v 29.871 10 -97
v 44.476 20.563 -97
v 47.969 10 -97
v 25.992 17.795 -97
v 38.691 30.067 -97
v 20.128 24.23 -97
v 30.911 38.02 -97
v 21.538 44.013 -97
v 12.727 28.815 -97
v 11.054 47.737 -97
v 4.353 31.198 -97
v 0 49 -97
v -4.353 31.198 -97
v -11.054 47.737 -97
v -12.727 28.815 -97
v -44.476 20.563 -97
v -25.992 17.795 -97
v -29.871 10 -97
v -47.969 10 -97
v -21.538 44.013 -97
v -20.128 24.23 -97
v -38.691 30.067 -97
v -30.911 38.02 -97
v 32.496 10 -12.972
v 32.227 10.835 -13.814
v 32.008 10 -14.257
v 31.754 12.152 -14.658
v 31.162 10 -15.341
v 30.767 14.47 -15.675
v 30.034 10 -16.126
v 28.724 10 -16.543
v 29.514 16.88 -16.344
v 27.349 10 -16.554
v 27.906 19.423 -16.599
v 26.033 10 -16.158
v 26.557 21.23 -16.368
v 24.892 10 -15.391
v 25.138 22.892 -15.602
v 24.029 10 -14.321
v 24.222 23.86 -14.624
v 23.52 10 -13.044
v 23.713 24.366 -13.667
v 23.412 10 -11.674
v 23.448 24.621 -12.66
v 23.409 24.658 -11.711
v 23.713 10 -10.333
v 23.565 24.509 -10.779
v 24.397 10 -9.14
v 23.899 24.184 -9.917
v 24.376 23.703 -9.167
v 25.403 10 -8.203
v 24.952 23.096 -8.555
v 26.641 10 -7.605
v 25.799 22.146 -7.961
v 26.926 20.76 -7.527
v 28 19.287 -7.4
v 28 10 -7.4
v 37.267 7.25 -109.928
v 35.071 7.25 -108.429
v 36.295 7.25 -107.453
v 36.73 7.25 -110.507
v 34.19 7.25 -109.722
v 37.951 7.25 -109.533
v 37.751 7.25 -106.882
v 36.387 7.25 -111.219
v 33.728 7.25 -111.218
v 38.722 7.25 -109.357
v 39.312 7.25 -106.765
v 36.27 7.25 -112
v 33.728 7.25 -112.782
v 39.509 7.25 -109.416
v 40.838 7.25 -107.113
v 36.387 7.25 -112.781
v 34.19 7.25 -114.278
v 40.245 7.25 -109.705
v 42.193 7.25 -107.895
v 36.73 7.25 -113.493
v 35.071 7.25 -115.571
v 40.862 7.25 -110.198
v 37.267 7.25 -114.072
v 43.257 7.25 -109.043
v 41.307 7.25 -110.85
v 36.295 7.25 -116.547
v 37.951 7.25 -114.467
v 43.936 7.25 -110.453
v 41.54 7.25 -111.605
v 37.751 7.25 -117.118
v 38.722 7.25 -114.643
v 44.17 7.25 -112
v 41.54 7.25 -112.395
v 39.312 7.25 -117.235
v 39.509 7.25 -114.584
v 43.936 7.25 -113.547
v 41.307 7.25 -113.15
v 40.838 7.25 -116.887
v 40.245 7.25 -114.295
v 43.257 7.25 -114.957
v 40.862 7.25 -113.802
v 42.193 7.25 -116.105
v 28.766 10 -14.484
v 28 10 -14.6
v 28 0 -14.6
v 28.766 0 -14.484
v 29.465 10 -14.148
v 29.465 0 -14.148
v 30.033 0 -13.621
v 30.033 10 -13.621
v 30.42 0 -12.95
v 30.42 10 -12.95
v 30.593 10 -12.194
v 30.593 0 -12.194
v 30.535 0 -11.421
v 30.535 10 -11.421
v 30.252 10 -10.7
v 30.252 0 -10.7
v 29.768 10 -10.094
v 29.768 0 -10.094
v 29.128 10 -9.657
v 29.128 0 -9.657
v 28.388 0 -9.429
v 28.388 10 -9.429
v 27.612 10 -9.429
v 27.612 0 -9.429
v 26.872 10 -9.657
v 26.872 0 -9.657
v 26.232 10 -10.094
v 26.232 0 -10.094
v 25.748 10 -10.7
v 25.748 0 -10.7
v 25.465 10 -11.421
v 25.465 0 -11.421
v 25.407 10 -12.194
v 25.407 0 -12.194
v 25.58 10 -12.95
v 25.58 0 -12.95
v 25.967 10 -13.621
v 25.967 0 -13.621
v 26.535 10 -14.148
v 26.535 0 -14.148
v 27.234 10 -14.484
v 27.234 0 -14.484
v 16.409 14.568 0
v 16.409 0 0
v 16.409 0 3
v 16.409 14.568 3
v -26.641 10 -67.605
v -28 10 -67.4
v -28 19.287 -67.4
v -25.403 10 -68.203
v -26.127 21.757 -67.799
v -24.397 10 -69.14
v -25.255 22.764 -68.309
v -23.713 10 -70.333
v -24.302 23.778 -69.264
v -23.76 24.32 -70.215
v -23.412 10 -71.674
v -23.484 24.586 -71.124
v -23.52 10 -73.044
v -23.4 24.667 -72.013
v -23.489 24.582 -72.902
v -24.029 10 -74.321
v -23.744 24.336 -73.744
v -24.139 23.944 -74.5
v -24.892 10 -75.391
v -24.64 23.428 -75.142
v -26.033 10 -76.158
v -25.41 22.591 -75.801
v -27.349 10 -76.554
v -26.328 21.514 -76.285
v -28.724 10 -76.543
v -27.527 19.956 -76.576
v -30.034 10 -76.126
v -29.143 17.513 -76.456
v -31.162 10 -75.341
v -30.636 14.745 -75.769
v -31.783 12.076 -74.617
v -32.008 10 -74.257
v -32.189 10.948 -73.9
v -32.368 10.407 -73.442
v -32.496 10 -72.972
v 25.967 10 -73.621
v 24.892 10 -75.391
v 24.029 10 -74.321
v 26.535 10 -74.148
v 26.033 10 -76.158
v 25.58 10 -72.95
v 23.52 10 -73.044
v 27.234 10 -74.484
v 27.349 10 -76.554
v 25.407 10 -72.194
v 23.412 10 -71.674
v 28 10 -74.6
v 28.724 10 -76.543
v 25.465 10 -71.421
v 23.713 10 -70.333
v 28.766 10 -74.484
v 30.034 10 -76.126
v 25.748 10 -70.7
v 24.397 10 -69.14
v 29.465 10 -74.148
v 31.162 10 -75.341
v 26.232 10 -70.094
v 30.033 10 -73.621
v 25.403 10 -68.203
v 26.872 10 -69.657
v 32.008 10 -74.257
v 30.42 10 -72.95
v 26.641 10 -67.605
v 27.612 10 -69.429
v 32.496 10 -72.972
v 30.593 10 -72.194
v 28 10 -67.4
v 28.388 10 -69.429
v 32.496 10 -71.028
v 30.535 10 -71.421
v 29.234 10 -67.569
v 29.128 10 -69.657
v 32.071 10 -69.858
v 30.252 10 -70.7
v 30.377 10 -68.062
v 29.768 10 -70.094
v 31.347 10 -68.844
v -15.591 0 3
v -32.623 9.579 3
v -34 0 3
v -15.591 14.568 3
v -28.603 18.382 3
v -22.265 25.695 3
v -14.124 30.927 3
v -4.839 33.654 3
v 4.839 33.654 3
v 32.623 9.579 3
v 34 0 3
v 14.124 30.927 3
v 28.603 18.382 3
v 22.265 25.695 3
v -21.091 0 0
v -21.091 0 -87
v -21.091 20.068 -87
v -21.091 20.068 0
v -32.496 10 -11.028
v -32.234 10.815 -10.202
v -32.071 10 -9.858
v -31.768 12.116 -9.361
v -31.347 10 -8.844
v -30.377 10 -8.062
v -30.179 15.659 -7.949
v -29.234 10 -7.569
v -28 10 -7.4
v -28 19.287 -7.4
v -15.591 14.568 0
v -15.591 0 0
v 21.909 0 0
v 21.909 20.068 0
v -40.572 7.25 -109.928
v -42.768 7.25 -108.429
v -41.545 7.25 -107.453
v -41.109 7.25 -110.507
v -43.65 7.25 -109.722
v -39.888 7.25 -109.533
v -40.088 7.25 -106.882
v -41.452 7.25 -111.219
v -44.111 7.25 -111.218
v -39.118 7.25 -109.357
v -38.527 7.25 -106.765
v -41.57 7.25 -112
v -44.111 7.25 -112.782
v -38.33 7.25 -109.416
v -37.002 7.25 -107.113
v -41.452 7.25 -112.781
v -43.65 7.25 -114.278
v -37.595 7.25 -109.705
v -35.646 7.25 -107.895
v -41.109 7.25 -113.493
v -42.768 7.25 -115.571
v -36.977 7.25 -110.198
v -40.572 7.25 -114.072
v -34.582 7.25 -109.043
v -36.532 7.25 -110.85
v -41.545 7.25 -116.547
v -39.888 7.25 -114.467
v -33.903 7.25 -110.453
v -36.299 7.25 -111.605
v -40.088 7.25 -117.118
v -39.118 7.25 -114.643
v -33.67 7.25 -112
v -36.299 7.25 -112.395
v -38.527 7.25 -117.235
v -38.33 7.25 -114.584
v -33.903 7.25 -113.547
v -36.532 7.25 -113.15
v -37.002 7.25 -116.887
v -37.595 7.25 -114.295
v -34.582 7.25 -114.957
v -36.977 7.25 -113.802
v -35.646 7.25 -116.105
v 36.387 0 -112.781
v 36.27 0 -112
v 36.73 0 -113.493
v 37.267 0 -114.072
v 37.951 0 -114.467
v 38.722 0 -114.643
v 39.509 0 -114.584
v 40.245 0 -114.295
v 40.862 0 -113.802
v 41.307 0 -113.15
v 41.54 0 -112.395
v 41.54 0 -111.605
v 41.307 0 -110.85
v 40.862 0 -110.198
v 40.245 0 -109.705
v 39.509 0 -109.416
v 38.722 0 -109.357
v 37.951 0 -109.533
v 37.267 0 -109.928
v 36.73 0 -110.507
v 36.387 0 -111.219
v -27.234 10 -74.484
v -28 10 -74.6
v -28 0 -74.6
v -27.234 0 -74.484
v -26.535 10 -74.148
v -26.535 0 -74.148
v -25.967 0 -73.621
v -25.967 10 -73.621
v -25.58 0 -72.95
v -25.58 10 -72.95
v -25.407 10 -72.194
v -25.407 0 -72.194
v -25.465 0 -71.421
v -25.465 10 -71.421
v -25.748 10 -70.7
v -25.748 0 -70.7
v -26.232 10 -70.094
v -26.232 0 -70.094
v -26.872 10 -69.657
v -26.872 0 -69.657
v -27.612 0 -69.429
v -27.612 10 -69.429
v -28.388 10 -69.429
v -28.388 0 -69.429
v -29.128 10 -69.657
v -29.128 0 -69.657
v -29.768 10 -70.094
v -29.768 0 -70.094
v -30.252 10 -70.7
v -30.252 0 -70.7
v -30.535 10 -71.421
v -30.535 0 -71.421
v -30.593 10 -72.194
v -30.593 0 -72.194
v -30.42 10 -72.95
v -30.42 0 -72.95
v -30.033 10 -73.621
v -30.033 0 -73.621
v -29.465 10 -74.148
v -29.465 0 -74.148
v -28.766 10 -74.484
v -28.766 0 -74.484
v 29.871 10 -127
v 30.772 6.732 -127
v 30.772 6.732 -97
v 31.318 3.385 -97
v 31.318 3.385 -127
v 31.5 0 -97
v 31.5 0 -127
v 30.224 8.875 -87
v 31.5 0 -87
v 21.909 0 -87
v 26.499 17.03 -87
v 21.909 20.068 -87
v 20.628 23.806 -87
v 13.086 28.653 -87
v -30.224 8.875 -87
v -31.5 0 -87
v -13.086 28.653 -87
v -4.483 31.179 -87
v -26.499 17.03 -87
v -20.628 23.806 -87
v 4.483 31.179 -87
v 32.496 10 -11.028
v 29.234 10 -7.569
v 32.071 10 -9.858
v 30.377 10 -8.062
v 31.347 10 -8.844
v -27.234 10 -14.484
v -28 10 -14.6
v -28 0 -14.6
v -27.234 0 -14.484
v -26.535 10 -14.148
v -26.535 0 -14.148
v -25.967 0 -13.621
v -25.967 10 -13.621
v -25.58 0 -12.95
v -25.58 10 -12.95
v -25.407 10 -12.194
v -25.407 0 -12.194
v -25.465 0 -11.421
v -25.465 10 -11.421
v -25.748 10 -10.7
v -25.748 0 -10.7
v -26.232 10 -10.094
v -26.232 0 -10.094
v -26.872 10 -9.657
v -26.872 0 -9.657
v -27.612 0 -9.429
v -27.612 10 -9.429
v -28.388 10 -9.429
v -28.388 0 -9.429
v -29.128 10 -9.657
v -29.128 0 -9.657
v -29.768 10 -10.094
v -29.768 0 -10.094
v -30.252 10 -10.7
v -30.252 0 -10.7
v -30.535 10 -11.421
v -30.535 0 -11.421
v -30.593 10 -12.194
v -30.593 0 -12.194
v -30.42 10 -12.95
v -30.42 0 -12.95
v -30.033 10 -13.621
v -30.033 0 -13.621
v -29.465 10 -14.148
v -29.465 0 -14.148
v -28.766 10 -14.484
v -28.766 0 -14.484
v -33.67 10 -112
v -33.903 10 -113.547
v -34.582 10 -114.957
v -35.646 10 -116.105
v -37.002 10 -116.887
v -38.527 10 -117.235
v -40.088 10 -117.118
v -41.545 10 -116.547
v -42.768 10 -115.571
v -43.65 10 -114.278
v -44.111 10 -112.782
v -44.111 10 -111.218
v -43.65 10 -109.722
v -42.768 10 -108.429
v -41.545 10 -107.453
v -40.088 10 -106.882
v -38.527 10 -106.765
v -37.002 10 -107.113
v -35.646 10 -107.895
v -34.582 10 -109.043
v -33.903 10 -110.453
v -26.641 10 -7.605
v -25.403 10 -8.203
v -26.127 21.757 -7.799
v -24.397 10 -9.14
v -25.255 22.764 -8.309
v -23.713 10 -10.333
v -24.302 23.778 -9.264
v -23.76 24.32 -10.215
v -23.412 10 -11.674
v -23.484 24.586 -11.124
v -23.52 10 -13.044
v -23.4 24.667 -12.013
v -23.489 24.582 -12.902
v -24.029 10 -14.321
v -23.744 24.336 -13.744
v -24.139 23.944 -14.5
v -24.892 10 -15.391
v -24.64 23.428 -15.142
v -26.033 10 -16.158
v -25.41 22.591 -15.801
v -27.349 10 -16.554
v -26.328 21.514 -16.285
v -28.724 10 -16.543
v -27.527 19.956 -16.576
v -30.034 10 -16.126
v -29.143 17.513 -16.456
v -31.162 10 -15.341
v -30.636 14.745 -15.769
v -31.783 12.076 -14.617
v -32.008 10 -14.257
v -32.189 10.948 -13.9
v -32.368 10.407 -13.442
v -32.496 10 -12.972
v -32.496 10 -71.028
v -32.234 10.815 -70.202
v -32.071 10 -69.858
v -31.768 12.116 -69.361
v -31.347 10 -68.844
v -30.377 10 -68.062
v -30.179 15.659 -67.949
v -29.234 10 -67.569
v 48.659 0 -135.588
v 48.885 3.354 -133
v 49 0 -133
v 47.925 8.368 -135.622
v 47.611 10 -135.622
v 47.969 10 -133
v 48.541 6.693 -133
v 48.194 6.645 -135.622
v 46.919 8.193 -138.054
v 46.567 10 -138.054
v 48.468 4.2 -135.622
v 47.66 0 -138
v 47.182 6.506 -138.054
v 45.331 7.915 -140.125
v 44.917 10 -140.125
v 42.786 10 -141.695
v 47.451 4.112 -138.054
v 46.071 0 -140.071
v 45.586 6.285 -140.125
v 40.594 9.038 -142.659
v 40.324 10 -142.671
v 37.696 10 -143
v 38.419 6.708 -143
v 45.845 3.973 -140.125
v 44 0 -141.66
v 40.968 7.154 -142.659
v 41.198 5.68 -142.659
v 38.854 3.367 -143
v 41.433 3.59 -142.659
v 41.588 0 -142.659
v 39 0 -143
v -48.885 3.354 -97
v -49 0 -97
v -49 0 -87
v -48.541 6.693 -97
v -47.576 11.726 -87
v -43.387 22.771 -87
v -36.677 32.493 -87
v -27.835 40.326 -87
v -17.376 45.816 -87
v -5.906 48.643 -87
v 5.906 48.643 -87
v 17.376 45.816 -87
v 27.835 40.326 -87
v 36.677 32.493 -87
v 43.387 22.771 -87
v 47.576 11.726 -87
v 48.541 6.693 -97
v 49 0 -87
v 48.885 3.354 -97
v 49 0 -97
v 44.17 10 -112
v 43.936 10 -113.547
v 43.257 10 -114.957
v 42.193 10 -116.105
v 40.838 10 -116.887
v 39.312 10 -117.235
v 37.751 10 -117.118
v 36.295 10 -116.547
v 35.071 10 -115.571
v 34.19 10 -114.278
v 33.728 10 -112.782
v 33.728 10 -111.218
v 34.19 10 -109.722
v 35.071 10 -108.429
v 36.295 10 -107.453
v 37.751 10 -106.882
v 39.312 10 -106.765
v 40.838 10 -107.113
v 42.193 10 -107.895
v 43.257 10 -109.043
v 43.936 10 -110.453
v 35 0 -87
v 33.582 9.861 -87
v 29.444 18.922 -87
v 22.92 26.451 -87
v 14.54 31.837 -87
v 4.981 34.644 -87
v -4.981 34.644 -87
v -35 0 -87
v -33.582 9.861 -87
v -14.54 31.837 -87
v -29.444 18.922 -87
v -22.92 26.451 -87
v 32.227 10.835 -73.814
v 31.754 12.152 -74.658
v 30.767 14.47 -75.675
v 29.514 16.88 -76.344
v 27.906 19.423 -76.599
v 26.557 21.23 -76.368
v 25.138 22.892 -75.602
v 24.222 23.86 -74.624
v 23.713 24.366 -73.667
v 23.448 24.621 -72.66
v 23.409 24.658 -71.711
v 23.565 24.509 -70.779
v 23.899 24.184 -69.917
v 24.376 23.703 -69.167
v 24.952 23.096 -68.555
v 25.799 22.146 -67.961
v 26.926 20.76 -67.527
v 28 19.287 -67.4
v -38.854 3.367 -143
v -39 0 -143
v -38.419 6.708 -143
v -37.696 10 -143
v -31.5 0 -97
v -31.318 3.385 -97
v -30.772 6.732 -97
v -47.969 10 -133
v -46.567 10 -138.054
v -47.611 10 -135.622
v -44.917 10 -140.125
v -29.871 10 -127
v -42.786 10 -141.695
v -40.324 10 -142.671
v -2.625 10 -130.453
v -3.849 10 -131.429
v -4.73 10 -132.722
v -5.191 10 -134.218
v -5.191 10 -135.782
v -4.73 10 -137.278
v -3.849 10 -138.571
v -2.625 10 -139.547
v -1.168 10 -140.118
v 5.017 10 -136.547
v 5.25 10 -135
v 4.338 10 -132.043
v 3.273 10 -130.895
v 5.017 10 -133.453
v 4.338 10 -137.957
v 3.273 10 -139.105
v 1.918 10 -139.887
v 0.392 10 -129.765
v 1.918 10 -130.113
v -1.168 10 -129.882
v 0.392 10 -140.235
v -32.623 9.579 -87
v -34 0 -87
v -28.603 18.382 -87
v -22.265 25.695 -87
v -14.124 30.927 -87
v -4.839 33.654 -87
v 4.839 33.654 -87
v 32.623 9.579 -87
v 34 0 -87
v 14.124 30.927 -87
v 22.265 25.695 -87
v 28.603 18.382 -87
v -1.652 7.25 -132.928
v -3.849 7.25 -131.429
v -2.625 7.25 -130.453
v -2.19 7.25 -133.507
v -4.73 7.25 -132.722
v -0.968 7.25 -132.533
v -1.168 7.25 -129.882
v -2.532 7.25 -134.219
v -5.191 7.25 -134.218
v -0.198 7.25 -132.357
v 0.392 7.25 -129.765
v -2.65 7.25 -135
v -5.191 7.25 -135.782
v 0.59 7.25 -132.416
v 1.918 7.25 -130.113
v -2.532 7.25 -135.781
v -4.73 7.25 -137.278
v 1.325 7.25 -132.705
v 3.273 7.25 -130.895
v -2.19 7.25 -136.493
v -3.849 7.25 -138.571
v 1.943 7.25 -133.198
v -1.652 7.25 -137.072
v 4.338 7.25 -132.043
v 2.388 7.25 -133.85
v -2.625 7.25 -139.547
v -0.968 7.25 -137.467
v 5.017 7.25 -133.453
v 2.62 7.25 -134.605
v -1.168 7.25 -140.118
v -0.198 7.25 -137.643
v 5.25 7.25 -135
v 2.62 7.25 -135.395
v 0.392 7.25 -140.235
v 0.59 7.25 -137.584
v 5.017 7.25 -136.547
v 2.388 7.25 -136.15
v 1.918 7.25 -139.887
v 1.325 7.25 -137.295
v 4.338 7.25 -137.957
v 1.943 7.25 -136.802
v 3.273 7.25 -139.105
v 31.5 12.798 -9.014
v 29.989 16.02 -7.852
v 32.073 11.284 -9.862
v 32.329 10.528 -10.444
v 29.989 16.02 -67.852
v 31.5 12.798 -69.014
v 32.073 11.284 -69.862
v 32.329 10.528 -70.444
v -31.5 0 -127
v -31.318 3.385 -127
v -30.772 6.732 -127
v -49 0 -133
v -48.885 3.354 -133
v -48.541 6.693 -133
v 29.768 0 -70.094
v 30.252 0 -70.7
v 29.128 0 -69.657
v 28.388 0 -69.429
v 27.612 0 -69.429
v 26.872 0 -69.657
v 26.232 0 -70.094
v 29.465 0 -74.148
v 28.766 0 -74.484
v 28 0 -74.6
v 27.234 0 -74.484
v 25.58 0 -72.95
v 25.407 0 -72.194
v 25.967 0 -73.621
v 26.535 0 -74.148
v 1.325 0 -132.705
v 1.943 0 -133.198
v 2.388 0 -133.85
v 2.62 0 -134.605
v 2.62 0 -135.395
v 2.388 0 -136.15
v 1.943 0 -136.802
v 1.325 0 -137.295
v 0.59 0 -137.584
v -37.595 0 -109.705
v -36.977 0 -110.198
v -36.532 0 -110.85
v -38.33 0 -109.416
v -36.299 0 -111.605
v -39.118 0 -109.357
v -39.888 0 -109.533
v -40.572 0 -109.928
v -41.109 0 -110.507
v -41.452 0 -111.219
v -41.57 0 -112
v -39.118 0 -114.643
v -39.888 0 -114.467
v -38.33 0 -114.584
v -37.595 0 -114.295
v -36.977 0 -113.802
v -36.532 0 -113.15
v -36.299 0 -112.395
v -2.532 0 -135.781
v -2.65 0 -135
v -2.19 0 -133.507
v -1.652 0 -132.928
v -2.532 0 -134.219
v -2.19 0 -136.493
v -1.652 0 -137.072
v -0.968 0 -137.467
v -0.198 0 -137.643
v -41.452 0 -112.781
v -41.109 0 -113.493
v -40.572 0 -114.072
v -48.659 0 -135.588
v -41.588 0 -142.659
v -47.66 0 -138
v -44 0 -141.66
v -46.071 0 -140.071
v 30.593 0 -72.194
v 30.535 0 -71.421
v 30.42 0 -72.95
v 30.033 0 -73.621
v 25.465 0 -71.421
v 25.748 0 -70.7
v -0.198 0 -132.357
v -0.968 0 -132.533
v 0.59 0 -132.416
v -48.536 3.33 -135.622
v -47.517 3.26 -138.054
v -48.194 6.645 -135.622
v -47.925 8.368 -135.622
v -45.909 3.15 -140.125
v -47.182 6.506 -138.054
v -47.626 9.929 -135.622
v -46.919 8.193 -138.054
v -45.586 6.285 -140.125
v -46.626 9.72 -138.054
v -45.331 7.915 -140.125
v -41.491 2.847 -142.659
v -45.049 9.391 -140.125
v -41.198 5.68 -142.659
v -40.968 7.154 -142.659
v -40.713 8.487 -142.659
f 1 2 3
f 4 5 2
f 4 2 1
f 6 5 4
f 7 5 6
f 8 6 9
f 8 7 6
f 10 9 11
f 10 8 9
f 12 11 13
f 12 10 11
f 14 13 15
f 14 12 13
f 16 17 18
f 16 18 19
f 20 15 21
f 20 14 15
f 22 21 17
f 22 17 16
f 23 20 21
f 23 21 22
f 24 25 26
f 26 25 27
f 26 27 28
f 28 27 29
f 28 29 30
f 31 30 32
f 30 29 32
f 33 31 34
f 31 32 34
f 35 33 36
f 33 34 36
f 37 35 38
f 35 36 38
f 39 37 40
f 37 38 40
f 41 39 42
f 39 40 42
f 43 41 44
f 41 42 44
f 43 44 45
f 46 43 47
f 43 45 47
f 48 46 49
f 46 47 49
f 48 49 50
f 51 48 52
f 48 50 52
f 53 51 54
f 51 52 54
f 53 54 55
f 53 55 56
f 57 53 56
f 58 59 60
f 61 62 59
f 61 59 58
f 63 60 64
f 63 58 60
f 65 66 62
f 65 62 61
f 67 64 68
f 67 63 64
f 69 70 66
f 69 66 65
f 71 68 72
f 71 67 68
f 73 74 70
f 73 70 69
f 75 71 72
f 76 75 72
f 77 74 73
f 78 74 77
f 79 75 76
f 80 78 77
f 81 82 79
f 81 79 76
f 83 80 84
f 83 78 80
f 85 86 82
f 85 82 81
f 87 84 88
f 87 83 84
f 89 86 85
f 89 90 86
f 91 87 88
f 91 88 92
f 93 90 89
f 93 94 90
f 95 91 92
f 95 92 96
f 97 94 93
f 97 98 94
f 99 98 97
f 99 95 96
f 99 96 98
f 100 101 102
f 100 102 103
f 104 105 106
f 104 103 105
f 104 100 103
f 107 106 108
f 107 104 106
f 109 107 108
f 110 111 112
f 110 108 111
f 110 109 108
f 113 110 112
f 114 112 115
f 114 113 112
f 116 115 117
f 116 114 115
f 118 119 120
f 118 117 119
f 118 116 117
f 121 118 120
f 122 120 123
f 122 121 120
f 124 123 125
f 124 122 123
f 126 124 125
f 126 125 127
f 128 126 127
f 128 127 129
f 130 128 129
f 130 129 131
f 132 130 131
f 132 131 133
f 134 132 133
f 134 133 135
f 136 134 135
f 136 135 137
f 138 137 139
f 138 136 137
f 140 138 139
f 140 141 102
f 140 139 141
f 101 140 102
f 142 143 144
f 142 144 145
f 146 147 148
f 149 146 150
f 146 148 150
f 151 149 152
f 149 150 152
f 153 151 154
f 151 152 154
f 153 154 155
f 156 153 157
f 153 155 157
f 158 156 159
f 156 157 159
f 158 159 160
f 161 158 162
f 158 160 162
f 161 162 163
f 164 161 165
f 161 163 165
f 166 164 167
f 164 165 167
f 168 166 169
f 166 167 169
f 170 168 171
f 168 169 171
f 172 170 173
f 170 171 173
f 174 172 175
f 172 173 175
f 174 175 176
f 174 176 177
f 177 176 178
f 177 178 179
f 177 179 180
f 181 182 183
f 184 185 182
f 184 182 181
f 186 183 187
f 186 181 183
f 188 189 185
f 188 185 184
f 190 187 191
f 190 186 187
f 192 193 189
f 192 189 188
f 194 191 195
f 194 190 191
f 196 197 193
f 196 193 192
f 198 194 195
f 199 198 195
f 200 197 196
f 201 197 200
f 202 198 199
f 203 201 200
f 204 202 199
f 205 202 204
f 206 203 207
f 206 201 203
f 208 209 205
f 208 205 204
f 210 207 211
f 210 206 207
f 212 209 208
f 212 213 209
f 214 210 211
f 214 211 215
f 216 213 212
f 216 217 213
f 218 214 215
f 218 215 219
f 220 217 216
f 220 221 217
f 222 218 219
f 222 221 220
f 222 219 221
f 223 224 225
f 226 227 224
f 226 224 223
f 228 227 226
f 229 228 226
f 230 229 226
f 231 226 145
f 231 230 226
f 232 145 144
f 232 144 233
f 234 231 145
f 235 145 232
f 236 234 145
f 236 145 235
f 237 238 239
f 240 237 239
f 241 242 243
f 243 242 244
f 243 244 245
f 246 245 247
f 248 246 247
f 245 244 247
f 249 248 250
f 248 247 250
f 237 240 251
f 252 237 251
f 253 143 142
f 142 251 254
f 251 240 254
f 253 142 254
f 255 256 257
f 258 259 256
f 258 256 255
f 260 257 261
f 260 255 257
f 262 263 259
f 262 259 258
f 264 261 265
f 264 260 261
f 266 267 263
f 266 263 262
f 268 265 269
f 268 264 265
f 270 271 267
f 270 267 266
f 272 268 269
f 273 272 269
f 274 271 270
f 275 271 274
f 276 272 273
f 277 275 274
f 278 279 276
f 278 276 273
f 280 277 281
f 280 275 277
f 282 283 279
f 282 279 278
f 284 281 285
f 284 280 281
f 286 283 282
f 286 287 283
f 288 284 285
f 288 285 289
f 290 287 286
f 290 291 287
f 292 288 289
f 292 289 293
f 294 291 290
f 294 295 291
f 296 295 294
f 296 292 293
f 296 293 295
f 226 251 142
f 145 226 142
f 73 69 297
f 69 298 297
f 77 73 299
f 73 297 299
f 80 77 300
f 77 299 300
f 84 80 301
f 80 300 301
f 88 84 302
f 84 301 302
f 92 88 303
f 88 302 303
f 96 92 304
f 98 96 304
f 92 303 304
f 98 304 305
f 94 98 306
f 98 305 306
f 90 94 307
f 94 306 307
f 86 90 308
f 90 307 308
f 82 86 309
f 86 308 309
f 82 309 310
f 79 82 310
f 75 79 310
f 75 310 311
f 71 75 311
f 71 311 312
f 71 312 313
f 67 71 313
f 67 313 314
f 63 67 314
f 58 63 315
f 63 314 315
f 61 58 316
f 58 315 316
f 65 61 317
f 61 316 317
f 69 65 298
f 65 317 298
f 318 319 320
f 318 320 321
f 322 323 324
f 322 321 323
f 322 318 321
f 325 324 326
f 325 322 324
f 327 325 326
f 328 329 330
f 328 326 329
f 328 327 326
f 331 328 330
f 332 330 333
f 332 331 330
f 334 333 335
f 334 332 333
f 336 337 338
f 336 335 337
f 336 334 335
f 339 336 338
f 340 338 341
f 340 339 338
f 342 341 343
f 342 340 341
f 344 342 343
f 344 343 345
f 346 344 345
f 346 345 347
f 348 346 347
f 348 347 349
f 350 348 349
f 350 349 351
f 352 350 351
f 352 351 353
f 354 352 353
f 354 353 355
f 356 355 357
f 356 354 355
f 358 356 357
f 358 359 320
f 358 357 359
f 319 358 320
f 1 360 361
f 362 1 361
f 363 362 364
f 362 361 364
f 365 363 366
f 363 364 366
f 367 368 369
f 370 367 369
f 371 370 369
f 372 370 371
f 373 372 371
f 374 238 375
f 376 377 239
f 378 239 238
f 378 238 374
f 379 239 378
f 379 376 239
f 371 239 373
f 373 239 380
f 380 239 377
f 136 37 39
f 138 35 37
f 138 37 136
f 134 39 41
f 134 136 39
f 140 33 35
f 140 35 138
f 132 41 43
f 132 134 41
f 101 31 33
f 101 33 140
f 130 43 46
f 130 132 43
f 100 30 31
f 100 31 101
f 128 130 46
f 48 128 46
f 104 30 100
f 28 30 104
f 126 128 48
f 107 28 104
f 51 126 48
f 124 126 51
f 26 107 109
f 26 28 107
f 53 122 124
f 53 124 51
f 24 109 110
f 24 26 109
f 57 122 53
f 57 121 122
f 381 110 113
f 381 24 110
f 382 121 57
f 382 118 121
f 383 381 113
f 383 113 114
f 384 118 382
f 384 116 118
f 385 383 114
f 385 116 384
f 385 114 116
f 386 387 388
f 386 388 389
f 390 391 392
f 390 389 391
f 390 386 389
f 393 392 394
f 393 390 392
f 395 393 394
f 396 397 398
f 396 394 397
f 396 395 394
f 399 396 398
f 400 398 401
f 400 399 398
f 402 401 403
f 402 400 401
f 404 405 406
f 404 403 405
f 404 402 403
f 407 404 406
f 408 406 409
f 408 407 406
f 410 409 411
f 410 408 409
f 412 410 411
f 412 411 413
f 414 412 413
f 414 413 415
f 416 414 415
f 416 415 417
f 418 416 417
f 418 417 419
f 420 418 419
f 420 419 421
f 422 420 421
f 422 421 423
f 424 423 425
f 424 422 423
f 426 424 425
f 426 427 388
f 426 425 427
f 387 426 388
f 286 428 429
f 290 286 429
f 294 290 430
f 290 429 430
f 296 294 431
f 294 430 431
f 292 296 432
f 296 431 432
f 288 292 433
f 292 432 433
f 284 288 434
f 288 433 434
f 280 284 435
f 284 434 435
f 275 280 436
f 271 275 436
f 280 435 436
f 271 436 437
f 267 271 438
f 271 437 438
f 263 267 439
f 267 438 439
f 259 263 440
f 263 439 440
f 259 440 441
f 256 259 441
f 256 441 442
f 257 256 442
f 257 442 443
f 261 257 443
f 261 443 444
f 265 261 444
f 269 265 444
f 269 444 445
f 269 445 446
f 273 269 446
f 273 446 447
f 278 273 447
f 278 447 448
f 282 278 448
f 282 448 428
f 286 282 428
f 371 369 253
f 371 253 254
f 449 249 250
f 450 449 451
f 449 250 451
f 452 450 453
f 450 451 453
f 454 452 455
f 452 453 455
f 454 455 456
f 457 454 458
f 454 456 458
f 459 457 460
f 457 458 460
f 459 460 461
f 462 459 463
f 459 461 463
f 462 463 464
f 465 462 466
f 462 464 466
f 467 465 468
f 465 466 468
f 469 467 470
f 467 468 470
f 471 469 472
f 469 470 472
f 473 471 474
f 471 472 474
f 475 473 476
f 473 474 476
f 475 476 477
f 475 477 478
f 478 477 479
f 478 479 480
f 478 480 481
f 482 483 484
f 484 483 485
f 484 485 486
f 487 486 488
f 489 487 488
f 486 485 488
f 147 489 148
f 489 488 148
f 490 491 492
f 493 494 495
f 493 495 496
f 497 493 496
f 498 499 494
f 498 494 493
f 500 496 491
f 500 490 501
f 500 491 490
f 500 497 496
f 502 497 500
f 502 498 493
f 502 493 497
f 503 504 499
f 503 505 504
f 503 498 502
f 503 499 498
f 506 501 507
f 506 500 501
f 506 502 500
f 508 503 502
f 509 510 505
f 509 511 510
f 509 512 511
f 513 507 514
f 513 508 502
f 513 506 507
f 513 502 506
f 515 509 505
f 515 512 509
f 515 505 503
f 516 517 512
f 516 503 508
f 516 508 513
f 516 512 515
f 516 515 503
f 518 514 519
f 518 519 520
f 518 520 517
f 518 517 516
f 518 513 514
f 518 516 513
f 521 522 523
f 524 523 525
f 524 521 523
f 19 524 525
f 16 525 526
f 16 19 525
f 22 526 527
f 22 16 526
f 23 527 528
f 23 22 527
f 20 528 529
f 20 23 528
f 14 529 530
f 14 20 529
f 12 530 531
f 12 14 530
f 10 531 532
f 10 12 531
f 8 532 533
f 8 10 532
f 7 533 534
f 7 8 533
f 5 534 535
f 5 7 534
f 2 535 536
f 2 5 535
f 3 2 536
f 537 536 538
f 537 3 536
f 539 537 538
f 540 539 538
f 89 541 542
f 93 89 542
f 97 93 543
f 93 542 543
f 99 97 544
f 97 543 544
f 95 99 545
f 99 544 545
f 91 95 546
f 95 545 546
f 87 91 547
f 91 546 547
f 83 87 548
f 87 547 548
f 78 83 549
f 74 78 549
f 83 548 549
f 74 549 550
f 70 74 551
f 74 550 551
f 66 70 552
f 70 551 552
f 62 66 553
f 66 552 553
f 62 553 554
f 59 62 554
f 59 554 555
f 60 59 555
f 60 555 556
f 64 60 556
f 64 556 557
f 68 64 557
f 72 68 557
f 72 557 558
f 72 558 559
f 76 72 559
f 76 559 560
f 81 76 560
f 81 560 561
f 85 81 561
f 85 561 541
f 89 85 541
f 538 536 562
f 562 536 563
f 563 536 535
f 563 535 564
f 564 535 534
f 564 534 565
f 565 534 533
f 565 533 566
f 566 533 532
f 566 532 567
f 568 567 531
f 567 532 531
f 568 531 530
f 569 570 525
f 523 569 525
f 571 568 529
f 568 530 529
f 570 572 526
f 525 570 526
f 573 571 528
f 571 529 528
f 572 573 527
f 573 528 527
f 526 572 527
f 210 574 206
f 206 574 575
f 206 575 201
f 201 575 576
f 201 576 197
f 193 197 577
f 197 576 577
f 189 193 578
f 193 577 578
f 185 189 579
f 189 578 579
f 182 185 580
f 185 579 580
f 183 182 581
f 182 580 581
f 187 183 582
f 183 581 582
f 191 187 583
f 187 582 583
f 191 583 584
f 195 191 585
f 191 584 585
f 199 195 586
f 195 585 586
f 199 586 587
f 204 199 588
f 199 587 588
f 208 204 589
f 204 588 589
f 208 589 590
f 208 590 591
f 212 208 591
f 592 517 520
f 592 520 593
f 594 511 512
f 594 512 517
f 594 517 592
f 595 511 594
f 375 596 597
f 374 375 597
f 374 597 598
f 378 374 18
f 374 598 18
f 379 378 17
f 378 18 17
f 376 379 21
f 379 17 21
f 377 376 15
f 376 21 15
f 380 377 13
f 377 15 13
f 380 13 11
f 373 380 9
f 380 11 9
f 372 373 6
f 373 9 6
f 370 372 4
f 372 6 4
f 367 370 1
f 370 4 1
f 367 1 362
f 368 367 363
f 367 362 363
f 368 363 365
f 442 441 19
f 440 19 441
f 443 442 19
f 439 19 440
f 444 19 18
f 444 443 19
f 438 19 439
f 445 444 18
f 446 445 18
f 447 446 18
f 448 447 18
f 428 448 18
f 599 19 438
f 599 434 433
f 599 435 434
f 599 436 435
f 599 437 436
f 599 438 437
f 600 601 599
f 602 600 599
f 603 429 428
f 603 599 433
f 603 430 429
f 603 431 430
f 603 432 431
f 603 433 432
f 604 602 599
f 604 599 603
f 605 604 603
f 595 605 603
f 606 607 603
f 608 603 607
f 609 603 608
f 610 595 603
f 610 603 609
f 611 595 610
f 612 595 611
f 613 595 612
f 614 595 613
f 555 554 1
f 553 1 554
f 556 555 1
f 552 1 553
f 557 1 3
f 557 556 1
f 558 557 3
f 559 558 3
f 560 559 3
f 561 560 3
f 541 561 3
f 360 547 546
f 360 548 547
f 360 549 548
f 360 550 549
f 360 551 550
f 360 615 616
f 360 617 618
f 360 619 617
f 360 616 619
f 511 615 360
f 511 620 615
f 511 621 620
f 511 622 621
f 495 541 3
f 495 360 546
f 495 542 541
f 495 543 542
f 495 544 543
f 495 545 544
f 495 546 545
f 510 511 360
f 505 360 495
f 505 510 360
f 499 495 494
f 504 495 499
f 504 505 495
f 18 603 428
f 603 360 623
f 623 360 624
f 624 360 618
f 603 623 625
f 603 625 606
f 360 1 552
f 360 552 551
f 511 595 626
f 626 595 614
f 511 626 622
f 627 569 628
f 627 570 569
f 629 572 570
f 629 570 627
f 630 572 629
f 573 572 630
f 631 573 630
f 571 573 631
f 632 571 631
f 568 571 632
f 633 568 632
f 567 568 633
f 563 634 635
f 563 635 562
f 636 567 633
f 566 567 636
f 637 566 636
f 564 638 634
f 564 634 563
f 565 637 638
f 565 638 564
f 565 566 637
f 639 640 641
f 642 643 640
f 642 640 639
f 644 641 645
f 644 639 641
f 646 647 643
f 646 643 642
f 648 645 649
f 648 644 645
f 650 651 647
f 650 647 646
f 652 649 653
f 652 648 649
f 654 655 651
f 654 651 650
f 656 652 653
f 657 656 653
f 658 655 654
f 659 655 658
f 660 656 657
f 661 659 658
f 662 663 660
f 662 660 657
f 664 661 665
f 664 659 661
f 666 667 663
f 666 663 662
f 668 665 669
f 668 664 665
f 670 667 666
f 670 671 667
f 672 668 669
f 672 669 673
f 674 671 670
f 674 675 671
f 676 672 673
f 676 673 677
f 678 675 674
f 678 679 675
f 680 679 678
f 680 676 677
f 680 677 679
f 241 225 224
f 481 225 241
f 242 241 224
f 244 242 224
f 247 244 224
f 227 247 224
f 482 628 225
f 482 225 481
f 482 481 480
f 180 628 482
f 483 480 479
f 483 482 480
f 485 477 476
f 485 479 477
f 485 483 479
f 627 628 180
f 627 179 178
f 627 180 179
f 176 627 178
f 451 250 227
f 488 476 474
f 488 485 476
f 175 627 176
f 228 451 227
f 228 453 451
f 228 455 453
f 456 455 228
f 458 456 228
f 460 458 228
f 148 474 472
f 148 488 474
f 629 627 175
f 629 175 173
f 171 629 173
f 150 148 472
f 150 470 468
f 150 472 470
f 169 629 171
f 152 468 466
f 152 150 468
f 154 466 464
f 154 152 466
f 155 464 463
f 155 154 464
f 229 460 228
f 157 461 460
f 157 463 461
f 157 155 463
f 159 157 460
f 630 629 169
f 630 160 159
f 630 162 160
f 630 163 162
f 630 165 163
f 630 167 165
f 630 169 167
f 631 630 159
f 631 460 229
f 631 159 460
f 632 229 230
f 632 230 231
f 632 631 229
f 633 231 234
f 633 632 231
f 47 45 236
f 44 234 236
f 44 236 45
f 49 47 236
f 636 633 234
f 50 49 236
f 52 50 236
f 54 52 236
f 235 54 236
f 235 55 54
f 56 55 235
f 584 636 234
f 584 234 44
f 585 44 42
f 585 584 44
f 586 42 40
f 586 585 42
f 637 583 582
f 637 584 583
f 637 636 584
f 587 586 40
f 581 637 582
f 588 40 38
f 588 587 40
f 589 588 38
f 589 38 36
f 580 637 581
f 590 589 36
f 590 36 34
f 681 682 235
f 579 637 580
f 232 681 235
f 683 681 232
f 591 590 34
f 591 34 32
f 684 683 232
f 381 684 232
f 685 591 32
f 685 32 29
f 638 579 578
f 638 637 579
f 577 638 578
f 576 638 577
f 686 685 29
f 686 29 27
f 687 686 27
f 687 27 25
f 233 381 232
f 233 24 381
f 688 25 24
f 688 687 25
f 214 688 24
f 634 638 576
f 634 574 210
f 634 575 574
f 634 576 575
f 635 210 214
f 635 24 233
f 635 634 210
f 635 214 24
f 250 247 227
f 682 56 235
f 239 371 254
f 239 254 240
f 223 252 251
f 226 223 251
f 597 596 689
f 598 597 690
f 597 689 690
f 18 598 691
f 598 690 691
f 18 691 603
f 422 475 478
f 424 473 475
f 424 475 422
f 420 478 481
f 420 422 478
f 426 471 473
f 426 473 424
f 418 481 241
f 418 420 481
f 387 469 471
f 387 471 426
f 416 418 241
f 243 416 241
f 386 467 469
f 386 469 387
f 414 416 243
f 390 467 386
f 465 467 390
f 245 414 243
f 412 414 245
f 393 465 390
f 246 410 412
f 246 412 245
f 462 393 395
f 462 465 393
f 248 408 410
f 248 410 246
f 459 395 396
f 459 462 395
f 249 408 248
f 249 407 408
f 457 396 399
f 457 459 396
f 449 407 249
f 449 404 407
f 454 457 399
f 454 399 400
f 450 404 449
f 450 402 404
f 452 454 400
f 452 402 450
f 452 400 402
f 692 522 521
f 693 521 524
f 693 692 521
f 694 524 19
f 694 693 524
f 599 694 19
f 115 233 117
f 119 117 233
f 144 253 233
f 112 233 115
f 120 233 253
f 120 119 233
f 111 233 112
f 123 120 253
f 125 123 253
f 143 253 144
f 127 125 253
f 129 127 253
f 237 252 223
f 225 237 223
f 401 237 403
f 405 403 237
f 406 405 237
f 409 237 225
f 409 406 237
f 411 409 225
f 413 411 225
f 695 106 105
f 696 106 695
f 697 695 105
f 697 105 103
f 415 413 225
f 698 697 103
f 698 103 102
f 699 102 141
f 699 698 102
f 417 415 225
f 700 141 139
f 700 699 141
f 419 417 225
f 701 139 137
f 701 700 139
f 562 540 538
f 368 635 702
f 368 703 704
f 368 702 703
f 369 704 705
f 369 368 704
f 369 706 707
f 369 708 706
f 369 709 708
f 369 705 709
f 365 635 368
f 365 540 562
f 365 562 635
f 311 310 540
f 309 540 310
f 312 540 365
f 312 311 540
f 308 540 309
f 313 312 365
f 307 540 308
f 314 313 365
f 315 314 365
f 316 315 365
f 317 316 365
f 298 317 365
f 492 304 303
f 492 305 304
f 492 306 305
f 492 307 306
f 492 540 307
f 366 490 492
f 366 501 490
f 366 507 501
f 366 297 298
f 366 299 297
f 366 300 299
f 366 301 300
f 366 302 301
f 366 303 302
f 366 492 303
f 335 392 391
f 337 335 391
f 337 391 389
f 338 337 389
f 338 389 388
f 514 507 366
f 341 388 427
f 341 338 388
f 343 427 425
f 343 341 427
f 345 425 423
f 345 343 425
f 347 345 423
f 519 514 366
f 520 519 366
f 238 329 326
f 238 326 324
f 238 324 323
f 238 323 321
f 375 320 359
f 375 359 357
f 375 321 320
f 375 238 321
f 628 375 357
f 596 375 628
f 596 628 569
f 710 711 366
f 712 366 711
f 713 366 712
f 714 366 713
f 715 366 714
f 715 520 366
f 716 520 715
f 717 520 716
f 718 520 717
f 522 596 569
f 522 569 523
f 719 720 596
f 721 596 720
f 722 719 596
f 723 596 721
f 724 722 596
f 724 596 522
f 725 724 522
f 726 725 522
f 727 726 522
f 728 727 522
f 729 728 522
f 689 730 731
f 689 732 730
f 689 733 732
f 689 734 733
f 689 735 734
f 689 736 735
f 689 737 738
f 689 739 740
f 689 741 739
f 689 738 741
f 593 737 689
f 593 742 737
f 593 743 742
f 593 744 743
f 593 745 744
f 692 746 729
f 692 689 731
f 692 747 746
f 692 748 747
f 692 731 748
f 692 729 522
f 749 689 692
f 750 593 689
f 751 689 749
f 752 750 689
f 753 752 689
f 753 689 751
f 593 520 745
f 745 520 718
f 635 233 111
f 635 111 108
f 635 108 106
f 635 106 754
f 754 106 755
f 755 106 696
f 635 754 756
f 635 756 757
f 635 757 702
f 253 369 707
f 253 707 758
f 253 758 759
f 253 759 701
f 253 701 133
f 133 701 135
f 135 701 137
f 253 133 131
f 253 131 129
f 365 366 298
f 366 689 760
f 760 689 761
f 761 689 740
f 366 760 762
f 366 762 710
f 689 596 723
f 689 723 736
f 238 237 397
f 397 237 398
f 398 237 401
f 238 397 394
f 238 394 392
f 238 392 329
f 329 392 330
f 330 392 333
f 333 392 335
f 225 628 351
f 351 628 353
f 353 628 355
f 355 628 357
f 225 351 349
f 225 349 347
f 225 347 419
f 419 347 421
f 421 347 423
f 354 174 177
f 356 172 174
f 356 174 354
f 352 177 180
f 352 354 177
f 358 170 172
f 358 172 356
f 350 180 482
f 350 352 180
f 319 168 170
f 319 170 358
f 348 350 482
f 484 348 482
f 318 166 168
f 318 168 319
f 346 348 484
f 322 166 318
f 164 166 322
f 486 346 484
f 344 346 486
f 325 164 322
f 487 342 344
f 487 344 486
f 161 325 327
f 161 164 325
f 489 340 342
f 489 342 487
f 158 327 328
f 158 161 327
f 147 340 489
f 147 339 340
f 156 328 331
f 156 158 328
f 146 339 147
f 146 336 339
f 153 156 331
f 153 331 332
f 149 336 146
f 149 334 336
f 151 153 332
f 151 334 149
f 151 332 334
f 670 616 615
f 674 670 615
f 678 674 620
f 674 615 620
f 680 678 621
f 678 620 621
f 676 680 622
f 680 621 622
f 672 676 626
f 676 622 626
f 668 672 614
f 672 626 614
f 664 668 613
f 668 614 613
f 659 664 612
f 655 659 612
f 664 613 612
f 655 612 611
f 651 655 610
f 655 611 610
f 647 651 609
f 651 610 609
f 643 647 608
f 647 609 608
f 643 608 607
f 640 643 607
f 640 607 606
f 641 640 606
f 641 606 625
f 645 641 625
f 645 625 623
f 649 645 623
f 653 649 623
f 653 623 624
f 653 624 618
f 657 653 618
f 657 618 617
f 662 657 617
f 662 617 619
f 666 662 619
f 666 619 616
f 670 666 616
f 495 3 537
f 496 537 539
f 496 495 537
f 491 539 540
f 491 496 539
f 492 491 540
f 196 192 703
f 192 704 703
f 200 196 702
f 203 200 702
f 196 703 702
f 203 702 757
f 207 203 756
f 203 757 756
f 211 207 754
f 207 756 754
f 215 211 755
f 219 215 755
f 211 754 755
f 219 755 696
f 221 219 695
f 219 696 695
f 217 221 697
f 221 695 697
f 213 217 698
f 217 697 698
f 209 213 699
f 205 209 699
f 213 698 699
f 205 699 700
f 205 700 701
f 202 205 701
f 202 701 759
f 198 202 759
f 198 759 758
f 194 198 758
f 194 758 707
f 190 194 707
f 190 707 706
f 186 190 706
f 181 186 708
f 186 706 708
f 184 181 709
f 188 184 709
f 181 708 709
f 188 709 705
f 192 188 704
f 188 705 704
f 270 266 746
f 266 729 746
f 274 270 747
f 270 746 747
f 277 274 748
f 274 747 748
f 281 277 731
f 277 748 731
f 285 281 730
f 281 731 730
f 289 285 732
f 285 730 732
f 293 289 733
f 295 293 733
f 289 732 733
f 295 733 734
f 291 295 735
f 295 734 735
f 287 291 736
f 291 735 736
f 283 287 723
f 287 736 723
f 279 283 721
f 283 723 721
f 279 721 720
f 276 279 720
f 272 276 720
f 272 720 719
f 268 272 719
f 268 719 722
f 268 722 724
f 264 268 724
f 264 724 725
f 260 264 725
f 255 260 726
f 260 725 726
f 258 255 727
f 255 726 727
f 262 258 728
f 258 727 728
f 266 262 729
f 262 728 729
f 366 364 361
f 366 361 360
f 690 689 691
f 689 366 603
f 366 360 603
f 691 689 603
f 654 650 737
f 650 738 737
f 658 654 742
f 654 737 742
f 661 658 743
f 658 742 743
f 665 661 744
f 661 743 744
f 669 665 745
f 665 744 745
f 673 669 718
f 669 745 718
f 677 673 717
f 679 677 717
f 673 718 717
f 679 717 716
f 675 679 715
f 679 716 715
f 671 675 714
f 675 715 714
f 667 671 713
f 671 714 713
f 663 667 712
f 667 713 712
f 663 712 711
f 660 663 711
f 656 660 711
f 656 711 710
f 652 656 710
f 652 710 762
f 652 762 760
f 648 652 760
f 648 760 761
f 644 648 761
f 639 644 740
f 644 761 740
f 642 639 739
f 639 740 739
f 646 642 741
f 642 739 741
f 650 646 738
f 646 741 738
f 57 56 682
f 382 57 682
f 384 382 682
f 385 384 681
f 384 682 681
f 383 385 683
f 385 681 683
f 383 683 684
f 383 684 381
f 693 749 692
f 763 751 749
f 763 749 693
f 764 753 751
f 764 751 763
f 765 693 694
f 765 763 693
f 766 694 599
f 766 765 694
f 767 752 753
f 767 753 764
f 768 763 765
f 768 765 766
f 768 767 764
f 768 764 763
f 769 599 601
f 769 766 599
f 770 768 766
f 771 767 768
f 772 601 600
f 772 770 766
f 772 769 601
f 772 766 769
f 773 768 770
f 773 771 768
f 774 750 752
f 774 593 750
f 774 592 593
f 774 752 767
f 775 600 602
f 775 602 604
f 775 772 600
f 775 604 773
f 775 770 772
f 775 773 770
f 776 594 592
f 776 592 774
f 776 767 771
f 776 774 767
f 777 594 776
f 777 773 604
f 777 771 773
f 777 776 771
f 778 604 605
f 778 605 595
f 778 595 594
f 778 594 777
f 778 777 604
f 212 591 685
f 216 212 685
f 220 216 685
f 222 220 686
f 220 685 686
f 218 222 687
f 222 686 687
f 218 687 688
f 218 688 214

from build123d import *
from build123d.topology import SkipClean

# Parameters (mm, degrees)
ESQUISSE2_R                                      = 31.5
ESQUISSE2_W                                      = 32
ESQUISSE2_H                                      = 32
BOSS_EXTRU_1_DEPTH                               = 3
BOSS_EXTRU_2_START                               = -100
ESQUISSE4_R                                      = 35
ESQUISSE4_R_2                                    = 31.5
BOSS_EXTRU_2_DEPTH                               = 100
BOSS_EXTRU_3_OUTLINE_R                           = 31.5
BOSS_EXTRU_3_OUTLINE_W                           = 43
BOSS_EXTRU_3_OUTLINE_H                           = 42.5
BOSS_EXTRU_3_DEPTH                               = 97
ESQUISSE6_R                                      = 31.5
ENL_V_MAT_EXTRU_1_DEPTH                          = 10
ESQUISSE7_R                                      = 49
ESQUISSE7_R_2                                    = 35
BOSS_EXTRU_4_DEPTH                               = 10
BOSS_EXTRU_5_START                               = 30
BOSS_EXTRU_5_DEPTH                               = 30
BOSS_EXTRU_6_START                               = 16
BOSS_EXTRU_6_DEPTH                               = 16
CONG_1_R                                         = 10
ESQUISSE11_W                                     = 137.068824
ESQUISSE11_H                                     = 50.889867
ENL_V_MAT_EXTRU_2_DEPTH                          = 153
CHAMBRAGE_POUR_VIS_T_TE_RONDE_6_PANS_D           = 5.3
CHAMBRAGE_POUR_VIS_T_TE_RONDE_6_PANS_DEPTH       = 18
CHAMBRAGE_POUR_VIS_T_TE_RONDE_6_PANS_CBORE_D     = 10.5
CHAMBRAGE_POUR_VIS_T_TE_RONDE_6_PANS_CBORE_DEPTH = 2.75
CHAMBRAGE_POUR_VIS_T_TE_RONDE_6_PANS_TIP         = 1.592281
ESQUISSE18_R                                     = 2.6
ENL_V_MAT_EXTRU_4_DEPTH                          = 25
ESQUISSE19_R                                     = 4.6
ENL_V_MAT_EXTRU_5_DEPTH                          = 25
ENL_V_START                                      = -90
ENL_V_MAT_EXTRU_6_DEPTH                          = 90


# Read off the part's stored shape, not the designer's step: Boss.-Extru.3
with BuildPart() as part:
    # Esquisse2 → Boss.-Extru.1 (new body)
    with BuildSketch(Plane.XY):
        Circle(ESQUISSE2_R)
        with Locations((0.409228, -1.432297)):
            Rectangle(ESQUISSE2_W, ESQUISSE2_H, mode=Mode.SUBTRACT)
    extrude(amount=BOSS_EXTRU_1_DEPTH)

    # Esquisse4 → Boss.-Extru.2 (add)
    with BuildSketch(Plane.XY.offset(3).offset(BOSS_EXTRU_2_START)):
        Circle(ESQUISSE4_R)
        Circle(ESQUISSE4_R_2, mode=Mode.SUBTRACT)
    extrude(amount=BOSS_EXTRU_2_DEPTH)

    # Boss.-Extru.3 outline → Boss.-Extru.3 (add)
    with BuildSketch(Plane(origin=(0, 0, 0), x_dir=(-1, 0, 0), z_dir=(0, 0, -1))):
        Circle(BOSS_EXTRU_3_OUTLINE_R)
        with Locations((-0.409228, -1.182297)):
            Rectangle(BOSS_EXTRU_3_OUTLINE_W, BOSS_EXTRU_3_OUTLINE_H, mode=Mode.SUBTRACT)
    extrude(amount=BOSS_EXTRU_3_DEPTH)

    # Esquisse6 → Enlèv. mat.-Extru.1 (cut)
    with BuildSketch(Plane(origin=(0, 0, -97), x_dir=(-1, 0, 0), z_dir=(0, 0, -1))):
        Circle(ESQUISSE6_R)
    extrude(amount=-ENL_V_MAT_EXTRU_1_DEPTH, mode=Mode.SUBTRACT)

    # Esquisse7 → Boss.-Extru.4 (add)
    with BuildSketch(Plane(origin=(0, 0, -97), x_dir=(-1, 0, 0), z_dir=(0, 0, -1))):
        Circle(ESQUISSE7_R)
        with Locations(Location((0, 0, 0), (0, 0, 180))):
            Circle(ESQUISSE7_R_2, mode=Mode.SUBTRACT)
    extrude(amount=-BOSS_EXTRU_4_DEPTH)

    # Esquisse8 → Boss.-Extru.5 (add)
    with SkipClean():  # the faces are left unmerged after this step: merging them gives an invalid solid
        with BuildSketch(Plane(origin=(0, 0, -97), x_dir=(-1, 0, 0), z_dir=(0, 0, -1)).offset(BOSS_EXTRU_5_START)):
            with BuildLine():
                Line((-47.96874, 10), (-29.870554, 10))
                ThreePointArc((-29.870554, 10), (-31.5, 0), (-29.870554, -10))
                Line((-29.870554, -10), (-47.96874, -10))
                ThreePointArc((-47.96874, -10), (-49, 0), (-47.96874, 10))
            make_face()
            with BuildLine():
                Line((29.870554, 10), (47.96874, 10))
                ThreePointArc((47.96874, 10), (49, 0), (47.96874, -10))
                Line((47.96874, -10), (29.870554, -10))
                ThreePointArc((29.870554, -10), (31.5, 0), (29.870554, 10))
            make_face()
        extrude(amount=-BOSS_EXTRU_5_DEPTH)

    # Esquisse10 → Boss.-Extru.6 (add)
    with SkipClean():  # the faces are left unmerged after this step: merging them gives an invalid solid
        with BuildSketch(Plane(origin=(0, 0, -127), x_dir=(-1, 0, 0), z_dir=(0, 0, -1)).offset(BOSS_EXTRU_6_START)):
            with BuildLine():
                Line((47.96874, 10), (-47.96874, 10))
                ThreePointArc((-47.96874, 10), (-49, 0), (-47.96874, -10))
                Line((-47.96874, -10), (47.96874, -10))
                ThreePointArc((47.96874, -10), (49, 0), (47.96874, 10))
            make_face()
        extrude(amount=-BOSS_EXTRU_6_DEPTH)

    # Congé1
    cong_1_edges = [part.edges().sort_by_distance(p)[0] for p in [
        (-49, 0, -143),
        (49, 0, -143),
    ]]
    fillet(cong_1_edges, radius=CONG_1_R)

    # Esquisse11 → Enlèv. mat.-Extru.2 (cut)
    with SkipClean():  # the faces are left unmerged after this step: merging them gives an invalid solid
        with BuildSketch(Plane(origin=(0, 0, -143), x_dir=(-1, 0, 0), z_dir=(0, 0, -1))):
            with Locations((0, -25.444933)):
                Rectangle(ESQUISSE11_W, ESQUISSE11_H)
        extrude(amount=-ENL_V_MAT_EXTRU_2_DEPTH, mode=Mode.SUBTRACT)

    # Chambrage pour Vis à tête ronde à 6 pans creux M51
    with Locations(Plane(origin=(0, 10, 0), x_dir=(1, 0, 0), z_dir=(0, 1, 0))):
        with Locations((-38.919647, 112), (38.919647, 112), (0, 135)):
            CounterBoreHole(CHAMBRAGE_POUR_VIS_T_TE_RONDE_6_PANS_D / 2, CHAMBRAGE_POUR_VIS_T_TE_RONDE_6_PANS_CBORE_D / 2, CHAMBRAGE_POUR_VIS_T_TE_RONDE_6_PANS_CBORE_DEPTH, depth=CHAMBRAGE_POUR_VIS_T_TE_RONDE_6_PANS_DEPTH)
            with Locations((0, 0, -(CHAMBRAGE_POUR_VIS_T_TE_RONDE_6_PANS_DEPTH + CHAMBRAGE_POUR_VIS_T_TE_RONDE_6_PANS_TIP / 2))):  # 118° drill point
                Cone(0, CHAMBRAGE_POUR_VIS_T_TE_RONDE_6_PANS_D / 2, CHAMBRAGE_POUR_VIS_T_TE_RONDE_6_PANS_TIP, mode=Mode.SUBTRACT)

    # Esquisse18 → Enlèv. mat.-Extru.4 (cut, symmetric)
    with SkipClean():  # the faces are left unmerged after this step: merging them gives an invalid solid
        with BuildSketch(Plane(origin=(0, 15, 0), x_dir=(-1, 0, 0), z_dir=(0, -1, 0))):
            with Locations(Location((28, 12, 0), (0, 0, 90))):
                Circle(ESQUISSE18_R)
            with Locations(Location((-28, 12, 0), (0, 0, 90))):
                Circle(ESQUISSE18_R)
            with Locations(Location((28, 72, 0), (0, 0, 90))):
                Circle(ESQUISSE18_R)
            with Locations(Location((-28, 72, 0), (0, 0, 90))):
                Circle(ESQUISSE18_R)
        extrude(amount=ENL_V_MAT_EXTRU_4_DEPTH, both=True, mode=Mode.SUBTRACT)

    # Esquisse19 → Enlèv. mat.-Extru.5 (cut)
    with SkipClean():  # the faces are left unmerged after this step: merging them gives an invalid solid
        with BuildSketch(Plane.ZX.offset(35)):
            with Locations((-72, 28)):
                Circle(ESQUISSE19_R)
            with Locations((-12, 28)):
                Circle(ESQUISSE19_R)
            with Locations((-12, -28)):
                Circle(ESQUISSE19_R)
            with Locations((-72, -28)):
                Circle(ESQUISSE19_R)
        extrude(amount=-ENL_V_MAT_EXTRU_5_DEPTH, mode=Mode.SUBTRACT)

    # Esquisse20 → Enlèv. mat.-Extru.6 (cut)
    with SkipClean():  # the faces are left unmerged after this step: merging them gives an invalid solid
        with BuildSketch(Plane.XY.offset(3).offset(ENL_V_START)):
            with BuildLine():
                Line((-35, 0), (-34, 0))
                ThreePointArc((-34, 0), (0, 34), (34, 0))
                Line((34, 0), (35, 0))
                ThreePointArc((35, 0), (0, 35), (-35, 0))
            make_face()
        extrude(amount=ENL_V_MAT_EXTRU_6_DEPTH, mode=Mode.SUBTRACT)


solid = part.part
